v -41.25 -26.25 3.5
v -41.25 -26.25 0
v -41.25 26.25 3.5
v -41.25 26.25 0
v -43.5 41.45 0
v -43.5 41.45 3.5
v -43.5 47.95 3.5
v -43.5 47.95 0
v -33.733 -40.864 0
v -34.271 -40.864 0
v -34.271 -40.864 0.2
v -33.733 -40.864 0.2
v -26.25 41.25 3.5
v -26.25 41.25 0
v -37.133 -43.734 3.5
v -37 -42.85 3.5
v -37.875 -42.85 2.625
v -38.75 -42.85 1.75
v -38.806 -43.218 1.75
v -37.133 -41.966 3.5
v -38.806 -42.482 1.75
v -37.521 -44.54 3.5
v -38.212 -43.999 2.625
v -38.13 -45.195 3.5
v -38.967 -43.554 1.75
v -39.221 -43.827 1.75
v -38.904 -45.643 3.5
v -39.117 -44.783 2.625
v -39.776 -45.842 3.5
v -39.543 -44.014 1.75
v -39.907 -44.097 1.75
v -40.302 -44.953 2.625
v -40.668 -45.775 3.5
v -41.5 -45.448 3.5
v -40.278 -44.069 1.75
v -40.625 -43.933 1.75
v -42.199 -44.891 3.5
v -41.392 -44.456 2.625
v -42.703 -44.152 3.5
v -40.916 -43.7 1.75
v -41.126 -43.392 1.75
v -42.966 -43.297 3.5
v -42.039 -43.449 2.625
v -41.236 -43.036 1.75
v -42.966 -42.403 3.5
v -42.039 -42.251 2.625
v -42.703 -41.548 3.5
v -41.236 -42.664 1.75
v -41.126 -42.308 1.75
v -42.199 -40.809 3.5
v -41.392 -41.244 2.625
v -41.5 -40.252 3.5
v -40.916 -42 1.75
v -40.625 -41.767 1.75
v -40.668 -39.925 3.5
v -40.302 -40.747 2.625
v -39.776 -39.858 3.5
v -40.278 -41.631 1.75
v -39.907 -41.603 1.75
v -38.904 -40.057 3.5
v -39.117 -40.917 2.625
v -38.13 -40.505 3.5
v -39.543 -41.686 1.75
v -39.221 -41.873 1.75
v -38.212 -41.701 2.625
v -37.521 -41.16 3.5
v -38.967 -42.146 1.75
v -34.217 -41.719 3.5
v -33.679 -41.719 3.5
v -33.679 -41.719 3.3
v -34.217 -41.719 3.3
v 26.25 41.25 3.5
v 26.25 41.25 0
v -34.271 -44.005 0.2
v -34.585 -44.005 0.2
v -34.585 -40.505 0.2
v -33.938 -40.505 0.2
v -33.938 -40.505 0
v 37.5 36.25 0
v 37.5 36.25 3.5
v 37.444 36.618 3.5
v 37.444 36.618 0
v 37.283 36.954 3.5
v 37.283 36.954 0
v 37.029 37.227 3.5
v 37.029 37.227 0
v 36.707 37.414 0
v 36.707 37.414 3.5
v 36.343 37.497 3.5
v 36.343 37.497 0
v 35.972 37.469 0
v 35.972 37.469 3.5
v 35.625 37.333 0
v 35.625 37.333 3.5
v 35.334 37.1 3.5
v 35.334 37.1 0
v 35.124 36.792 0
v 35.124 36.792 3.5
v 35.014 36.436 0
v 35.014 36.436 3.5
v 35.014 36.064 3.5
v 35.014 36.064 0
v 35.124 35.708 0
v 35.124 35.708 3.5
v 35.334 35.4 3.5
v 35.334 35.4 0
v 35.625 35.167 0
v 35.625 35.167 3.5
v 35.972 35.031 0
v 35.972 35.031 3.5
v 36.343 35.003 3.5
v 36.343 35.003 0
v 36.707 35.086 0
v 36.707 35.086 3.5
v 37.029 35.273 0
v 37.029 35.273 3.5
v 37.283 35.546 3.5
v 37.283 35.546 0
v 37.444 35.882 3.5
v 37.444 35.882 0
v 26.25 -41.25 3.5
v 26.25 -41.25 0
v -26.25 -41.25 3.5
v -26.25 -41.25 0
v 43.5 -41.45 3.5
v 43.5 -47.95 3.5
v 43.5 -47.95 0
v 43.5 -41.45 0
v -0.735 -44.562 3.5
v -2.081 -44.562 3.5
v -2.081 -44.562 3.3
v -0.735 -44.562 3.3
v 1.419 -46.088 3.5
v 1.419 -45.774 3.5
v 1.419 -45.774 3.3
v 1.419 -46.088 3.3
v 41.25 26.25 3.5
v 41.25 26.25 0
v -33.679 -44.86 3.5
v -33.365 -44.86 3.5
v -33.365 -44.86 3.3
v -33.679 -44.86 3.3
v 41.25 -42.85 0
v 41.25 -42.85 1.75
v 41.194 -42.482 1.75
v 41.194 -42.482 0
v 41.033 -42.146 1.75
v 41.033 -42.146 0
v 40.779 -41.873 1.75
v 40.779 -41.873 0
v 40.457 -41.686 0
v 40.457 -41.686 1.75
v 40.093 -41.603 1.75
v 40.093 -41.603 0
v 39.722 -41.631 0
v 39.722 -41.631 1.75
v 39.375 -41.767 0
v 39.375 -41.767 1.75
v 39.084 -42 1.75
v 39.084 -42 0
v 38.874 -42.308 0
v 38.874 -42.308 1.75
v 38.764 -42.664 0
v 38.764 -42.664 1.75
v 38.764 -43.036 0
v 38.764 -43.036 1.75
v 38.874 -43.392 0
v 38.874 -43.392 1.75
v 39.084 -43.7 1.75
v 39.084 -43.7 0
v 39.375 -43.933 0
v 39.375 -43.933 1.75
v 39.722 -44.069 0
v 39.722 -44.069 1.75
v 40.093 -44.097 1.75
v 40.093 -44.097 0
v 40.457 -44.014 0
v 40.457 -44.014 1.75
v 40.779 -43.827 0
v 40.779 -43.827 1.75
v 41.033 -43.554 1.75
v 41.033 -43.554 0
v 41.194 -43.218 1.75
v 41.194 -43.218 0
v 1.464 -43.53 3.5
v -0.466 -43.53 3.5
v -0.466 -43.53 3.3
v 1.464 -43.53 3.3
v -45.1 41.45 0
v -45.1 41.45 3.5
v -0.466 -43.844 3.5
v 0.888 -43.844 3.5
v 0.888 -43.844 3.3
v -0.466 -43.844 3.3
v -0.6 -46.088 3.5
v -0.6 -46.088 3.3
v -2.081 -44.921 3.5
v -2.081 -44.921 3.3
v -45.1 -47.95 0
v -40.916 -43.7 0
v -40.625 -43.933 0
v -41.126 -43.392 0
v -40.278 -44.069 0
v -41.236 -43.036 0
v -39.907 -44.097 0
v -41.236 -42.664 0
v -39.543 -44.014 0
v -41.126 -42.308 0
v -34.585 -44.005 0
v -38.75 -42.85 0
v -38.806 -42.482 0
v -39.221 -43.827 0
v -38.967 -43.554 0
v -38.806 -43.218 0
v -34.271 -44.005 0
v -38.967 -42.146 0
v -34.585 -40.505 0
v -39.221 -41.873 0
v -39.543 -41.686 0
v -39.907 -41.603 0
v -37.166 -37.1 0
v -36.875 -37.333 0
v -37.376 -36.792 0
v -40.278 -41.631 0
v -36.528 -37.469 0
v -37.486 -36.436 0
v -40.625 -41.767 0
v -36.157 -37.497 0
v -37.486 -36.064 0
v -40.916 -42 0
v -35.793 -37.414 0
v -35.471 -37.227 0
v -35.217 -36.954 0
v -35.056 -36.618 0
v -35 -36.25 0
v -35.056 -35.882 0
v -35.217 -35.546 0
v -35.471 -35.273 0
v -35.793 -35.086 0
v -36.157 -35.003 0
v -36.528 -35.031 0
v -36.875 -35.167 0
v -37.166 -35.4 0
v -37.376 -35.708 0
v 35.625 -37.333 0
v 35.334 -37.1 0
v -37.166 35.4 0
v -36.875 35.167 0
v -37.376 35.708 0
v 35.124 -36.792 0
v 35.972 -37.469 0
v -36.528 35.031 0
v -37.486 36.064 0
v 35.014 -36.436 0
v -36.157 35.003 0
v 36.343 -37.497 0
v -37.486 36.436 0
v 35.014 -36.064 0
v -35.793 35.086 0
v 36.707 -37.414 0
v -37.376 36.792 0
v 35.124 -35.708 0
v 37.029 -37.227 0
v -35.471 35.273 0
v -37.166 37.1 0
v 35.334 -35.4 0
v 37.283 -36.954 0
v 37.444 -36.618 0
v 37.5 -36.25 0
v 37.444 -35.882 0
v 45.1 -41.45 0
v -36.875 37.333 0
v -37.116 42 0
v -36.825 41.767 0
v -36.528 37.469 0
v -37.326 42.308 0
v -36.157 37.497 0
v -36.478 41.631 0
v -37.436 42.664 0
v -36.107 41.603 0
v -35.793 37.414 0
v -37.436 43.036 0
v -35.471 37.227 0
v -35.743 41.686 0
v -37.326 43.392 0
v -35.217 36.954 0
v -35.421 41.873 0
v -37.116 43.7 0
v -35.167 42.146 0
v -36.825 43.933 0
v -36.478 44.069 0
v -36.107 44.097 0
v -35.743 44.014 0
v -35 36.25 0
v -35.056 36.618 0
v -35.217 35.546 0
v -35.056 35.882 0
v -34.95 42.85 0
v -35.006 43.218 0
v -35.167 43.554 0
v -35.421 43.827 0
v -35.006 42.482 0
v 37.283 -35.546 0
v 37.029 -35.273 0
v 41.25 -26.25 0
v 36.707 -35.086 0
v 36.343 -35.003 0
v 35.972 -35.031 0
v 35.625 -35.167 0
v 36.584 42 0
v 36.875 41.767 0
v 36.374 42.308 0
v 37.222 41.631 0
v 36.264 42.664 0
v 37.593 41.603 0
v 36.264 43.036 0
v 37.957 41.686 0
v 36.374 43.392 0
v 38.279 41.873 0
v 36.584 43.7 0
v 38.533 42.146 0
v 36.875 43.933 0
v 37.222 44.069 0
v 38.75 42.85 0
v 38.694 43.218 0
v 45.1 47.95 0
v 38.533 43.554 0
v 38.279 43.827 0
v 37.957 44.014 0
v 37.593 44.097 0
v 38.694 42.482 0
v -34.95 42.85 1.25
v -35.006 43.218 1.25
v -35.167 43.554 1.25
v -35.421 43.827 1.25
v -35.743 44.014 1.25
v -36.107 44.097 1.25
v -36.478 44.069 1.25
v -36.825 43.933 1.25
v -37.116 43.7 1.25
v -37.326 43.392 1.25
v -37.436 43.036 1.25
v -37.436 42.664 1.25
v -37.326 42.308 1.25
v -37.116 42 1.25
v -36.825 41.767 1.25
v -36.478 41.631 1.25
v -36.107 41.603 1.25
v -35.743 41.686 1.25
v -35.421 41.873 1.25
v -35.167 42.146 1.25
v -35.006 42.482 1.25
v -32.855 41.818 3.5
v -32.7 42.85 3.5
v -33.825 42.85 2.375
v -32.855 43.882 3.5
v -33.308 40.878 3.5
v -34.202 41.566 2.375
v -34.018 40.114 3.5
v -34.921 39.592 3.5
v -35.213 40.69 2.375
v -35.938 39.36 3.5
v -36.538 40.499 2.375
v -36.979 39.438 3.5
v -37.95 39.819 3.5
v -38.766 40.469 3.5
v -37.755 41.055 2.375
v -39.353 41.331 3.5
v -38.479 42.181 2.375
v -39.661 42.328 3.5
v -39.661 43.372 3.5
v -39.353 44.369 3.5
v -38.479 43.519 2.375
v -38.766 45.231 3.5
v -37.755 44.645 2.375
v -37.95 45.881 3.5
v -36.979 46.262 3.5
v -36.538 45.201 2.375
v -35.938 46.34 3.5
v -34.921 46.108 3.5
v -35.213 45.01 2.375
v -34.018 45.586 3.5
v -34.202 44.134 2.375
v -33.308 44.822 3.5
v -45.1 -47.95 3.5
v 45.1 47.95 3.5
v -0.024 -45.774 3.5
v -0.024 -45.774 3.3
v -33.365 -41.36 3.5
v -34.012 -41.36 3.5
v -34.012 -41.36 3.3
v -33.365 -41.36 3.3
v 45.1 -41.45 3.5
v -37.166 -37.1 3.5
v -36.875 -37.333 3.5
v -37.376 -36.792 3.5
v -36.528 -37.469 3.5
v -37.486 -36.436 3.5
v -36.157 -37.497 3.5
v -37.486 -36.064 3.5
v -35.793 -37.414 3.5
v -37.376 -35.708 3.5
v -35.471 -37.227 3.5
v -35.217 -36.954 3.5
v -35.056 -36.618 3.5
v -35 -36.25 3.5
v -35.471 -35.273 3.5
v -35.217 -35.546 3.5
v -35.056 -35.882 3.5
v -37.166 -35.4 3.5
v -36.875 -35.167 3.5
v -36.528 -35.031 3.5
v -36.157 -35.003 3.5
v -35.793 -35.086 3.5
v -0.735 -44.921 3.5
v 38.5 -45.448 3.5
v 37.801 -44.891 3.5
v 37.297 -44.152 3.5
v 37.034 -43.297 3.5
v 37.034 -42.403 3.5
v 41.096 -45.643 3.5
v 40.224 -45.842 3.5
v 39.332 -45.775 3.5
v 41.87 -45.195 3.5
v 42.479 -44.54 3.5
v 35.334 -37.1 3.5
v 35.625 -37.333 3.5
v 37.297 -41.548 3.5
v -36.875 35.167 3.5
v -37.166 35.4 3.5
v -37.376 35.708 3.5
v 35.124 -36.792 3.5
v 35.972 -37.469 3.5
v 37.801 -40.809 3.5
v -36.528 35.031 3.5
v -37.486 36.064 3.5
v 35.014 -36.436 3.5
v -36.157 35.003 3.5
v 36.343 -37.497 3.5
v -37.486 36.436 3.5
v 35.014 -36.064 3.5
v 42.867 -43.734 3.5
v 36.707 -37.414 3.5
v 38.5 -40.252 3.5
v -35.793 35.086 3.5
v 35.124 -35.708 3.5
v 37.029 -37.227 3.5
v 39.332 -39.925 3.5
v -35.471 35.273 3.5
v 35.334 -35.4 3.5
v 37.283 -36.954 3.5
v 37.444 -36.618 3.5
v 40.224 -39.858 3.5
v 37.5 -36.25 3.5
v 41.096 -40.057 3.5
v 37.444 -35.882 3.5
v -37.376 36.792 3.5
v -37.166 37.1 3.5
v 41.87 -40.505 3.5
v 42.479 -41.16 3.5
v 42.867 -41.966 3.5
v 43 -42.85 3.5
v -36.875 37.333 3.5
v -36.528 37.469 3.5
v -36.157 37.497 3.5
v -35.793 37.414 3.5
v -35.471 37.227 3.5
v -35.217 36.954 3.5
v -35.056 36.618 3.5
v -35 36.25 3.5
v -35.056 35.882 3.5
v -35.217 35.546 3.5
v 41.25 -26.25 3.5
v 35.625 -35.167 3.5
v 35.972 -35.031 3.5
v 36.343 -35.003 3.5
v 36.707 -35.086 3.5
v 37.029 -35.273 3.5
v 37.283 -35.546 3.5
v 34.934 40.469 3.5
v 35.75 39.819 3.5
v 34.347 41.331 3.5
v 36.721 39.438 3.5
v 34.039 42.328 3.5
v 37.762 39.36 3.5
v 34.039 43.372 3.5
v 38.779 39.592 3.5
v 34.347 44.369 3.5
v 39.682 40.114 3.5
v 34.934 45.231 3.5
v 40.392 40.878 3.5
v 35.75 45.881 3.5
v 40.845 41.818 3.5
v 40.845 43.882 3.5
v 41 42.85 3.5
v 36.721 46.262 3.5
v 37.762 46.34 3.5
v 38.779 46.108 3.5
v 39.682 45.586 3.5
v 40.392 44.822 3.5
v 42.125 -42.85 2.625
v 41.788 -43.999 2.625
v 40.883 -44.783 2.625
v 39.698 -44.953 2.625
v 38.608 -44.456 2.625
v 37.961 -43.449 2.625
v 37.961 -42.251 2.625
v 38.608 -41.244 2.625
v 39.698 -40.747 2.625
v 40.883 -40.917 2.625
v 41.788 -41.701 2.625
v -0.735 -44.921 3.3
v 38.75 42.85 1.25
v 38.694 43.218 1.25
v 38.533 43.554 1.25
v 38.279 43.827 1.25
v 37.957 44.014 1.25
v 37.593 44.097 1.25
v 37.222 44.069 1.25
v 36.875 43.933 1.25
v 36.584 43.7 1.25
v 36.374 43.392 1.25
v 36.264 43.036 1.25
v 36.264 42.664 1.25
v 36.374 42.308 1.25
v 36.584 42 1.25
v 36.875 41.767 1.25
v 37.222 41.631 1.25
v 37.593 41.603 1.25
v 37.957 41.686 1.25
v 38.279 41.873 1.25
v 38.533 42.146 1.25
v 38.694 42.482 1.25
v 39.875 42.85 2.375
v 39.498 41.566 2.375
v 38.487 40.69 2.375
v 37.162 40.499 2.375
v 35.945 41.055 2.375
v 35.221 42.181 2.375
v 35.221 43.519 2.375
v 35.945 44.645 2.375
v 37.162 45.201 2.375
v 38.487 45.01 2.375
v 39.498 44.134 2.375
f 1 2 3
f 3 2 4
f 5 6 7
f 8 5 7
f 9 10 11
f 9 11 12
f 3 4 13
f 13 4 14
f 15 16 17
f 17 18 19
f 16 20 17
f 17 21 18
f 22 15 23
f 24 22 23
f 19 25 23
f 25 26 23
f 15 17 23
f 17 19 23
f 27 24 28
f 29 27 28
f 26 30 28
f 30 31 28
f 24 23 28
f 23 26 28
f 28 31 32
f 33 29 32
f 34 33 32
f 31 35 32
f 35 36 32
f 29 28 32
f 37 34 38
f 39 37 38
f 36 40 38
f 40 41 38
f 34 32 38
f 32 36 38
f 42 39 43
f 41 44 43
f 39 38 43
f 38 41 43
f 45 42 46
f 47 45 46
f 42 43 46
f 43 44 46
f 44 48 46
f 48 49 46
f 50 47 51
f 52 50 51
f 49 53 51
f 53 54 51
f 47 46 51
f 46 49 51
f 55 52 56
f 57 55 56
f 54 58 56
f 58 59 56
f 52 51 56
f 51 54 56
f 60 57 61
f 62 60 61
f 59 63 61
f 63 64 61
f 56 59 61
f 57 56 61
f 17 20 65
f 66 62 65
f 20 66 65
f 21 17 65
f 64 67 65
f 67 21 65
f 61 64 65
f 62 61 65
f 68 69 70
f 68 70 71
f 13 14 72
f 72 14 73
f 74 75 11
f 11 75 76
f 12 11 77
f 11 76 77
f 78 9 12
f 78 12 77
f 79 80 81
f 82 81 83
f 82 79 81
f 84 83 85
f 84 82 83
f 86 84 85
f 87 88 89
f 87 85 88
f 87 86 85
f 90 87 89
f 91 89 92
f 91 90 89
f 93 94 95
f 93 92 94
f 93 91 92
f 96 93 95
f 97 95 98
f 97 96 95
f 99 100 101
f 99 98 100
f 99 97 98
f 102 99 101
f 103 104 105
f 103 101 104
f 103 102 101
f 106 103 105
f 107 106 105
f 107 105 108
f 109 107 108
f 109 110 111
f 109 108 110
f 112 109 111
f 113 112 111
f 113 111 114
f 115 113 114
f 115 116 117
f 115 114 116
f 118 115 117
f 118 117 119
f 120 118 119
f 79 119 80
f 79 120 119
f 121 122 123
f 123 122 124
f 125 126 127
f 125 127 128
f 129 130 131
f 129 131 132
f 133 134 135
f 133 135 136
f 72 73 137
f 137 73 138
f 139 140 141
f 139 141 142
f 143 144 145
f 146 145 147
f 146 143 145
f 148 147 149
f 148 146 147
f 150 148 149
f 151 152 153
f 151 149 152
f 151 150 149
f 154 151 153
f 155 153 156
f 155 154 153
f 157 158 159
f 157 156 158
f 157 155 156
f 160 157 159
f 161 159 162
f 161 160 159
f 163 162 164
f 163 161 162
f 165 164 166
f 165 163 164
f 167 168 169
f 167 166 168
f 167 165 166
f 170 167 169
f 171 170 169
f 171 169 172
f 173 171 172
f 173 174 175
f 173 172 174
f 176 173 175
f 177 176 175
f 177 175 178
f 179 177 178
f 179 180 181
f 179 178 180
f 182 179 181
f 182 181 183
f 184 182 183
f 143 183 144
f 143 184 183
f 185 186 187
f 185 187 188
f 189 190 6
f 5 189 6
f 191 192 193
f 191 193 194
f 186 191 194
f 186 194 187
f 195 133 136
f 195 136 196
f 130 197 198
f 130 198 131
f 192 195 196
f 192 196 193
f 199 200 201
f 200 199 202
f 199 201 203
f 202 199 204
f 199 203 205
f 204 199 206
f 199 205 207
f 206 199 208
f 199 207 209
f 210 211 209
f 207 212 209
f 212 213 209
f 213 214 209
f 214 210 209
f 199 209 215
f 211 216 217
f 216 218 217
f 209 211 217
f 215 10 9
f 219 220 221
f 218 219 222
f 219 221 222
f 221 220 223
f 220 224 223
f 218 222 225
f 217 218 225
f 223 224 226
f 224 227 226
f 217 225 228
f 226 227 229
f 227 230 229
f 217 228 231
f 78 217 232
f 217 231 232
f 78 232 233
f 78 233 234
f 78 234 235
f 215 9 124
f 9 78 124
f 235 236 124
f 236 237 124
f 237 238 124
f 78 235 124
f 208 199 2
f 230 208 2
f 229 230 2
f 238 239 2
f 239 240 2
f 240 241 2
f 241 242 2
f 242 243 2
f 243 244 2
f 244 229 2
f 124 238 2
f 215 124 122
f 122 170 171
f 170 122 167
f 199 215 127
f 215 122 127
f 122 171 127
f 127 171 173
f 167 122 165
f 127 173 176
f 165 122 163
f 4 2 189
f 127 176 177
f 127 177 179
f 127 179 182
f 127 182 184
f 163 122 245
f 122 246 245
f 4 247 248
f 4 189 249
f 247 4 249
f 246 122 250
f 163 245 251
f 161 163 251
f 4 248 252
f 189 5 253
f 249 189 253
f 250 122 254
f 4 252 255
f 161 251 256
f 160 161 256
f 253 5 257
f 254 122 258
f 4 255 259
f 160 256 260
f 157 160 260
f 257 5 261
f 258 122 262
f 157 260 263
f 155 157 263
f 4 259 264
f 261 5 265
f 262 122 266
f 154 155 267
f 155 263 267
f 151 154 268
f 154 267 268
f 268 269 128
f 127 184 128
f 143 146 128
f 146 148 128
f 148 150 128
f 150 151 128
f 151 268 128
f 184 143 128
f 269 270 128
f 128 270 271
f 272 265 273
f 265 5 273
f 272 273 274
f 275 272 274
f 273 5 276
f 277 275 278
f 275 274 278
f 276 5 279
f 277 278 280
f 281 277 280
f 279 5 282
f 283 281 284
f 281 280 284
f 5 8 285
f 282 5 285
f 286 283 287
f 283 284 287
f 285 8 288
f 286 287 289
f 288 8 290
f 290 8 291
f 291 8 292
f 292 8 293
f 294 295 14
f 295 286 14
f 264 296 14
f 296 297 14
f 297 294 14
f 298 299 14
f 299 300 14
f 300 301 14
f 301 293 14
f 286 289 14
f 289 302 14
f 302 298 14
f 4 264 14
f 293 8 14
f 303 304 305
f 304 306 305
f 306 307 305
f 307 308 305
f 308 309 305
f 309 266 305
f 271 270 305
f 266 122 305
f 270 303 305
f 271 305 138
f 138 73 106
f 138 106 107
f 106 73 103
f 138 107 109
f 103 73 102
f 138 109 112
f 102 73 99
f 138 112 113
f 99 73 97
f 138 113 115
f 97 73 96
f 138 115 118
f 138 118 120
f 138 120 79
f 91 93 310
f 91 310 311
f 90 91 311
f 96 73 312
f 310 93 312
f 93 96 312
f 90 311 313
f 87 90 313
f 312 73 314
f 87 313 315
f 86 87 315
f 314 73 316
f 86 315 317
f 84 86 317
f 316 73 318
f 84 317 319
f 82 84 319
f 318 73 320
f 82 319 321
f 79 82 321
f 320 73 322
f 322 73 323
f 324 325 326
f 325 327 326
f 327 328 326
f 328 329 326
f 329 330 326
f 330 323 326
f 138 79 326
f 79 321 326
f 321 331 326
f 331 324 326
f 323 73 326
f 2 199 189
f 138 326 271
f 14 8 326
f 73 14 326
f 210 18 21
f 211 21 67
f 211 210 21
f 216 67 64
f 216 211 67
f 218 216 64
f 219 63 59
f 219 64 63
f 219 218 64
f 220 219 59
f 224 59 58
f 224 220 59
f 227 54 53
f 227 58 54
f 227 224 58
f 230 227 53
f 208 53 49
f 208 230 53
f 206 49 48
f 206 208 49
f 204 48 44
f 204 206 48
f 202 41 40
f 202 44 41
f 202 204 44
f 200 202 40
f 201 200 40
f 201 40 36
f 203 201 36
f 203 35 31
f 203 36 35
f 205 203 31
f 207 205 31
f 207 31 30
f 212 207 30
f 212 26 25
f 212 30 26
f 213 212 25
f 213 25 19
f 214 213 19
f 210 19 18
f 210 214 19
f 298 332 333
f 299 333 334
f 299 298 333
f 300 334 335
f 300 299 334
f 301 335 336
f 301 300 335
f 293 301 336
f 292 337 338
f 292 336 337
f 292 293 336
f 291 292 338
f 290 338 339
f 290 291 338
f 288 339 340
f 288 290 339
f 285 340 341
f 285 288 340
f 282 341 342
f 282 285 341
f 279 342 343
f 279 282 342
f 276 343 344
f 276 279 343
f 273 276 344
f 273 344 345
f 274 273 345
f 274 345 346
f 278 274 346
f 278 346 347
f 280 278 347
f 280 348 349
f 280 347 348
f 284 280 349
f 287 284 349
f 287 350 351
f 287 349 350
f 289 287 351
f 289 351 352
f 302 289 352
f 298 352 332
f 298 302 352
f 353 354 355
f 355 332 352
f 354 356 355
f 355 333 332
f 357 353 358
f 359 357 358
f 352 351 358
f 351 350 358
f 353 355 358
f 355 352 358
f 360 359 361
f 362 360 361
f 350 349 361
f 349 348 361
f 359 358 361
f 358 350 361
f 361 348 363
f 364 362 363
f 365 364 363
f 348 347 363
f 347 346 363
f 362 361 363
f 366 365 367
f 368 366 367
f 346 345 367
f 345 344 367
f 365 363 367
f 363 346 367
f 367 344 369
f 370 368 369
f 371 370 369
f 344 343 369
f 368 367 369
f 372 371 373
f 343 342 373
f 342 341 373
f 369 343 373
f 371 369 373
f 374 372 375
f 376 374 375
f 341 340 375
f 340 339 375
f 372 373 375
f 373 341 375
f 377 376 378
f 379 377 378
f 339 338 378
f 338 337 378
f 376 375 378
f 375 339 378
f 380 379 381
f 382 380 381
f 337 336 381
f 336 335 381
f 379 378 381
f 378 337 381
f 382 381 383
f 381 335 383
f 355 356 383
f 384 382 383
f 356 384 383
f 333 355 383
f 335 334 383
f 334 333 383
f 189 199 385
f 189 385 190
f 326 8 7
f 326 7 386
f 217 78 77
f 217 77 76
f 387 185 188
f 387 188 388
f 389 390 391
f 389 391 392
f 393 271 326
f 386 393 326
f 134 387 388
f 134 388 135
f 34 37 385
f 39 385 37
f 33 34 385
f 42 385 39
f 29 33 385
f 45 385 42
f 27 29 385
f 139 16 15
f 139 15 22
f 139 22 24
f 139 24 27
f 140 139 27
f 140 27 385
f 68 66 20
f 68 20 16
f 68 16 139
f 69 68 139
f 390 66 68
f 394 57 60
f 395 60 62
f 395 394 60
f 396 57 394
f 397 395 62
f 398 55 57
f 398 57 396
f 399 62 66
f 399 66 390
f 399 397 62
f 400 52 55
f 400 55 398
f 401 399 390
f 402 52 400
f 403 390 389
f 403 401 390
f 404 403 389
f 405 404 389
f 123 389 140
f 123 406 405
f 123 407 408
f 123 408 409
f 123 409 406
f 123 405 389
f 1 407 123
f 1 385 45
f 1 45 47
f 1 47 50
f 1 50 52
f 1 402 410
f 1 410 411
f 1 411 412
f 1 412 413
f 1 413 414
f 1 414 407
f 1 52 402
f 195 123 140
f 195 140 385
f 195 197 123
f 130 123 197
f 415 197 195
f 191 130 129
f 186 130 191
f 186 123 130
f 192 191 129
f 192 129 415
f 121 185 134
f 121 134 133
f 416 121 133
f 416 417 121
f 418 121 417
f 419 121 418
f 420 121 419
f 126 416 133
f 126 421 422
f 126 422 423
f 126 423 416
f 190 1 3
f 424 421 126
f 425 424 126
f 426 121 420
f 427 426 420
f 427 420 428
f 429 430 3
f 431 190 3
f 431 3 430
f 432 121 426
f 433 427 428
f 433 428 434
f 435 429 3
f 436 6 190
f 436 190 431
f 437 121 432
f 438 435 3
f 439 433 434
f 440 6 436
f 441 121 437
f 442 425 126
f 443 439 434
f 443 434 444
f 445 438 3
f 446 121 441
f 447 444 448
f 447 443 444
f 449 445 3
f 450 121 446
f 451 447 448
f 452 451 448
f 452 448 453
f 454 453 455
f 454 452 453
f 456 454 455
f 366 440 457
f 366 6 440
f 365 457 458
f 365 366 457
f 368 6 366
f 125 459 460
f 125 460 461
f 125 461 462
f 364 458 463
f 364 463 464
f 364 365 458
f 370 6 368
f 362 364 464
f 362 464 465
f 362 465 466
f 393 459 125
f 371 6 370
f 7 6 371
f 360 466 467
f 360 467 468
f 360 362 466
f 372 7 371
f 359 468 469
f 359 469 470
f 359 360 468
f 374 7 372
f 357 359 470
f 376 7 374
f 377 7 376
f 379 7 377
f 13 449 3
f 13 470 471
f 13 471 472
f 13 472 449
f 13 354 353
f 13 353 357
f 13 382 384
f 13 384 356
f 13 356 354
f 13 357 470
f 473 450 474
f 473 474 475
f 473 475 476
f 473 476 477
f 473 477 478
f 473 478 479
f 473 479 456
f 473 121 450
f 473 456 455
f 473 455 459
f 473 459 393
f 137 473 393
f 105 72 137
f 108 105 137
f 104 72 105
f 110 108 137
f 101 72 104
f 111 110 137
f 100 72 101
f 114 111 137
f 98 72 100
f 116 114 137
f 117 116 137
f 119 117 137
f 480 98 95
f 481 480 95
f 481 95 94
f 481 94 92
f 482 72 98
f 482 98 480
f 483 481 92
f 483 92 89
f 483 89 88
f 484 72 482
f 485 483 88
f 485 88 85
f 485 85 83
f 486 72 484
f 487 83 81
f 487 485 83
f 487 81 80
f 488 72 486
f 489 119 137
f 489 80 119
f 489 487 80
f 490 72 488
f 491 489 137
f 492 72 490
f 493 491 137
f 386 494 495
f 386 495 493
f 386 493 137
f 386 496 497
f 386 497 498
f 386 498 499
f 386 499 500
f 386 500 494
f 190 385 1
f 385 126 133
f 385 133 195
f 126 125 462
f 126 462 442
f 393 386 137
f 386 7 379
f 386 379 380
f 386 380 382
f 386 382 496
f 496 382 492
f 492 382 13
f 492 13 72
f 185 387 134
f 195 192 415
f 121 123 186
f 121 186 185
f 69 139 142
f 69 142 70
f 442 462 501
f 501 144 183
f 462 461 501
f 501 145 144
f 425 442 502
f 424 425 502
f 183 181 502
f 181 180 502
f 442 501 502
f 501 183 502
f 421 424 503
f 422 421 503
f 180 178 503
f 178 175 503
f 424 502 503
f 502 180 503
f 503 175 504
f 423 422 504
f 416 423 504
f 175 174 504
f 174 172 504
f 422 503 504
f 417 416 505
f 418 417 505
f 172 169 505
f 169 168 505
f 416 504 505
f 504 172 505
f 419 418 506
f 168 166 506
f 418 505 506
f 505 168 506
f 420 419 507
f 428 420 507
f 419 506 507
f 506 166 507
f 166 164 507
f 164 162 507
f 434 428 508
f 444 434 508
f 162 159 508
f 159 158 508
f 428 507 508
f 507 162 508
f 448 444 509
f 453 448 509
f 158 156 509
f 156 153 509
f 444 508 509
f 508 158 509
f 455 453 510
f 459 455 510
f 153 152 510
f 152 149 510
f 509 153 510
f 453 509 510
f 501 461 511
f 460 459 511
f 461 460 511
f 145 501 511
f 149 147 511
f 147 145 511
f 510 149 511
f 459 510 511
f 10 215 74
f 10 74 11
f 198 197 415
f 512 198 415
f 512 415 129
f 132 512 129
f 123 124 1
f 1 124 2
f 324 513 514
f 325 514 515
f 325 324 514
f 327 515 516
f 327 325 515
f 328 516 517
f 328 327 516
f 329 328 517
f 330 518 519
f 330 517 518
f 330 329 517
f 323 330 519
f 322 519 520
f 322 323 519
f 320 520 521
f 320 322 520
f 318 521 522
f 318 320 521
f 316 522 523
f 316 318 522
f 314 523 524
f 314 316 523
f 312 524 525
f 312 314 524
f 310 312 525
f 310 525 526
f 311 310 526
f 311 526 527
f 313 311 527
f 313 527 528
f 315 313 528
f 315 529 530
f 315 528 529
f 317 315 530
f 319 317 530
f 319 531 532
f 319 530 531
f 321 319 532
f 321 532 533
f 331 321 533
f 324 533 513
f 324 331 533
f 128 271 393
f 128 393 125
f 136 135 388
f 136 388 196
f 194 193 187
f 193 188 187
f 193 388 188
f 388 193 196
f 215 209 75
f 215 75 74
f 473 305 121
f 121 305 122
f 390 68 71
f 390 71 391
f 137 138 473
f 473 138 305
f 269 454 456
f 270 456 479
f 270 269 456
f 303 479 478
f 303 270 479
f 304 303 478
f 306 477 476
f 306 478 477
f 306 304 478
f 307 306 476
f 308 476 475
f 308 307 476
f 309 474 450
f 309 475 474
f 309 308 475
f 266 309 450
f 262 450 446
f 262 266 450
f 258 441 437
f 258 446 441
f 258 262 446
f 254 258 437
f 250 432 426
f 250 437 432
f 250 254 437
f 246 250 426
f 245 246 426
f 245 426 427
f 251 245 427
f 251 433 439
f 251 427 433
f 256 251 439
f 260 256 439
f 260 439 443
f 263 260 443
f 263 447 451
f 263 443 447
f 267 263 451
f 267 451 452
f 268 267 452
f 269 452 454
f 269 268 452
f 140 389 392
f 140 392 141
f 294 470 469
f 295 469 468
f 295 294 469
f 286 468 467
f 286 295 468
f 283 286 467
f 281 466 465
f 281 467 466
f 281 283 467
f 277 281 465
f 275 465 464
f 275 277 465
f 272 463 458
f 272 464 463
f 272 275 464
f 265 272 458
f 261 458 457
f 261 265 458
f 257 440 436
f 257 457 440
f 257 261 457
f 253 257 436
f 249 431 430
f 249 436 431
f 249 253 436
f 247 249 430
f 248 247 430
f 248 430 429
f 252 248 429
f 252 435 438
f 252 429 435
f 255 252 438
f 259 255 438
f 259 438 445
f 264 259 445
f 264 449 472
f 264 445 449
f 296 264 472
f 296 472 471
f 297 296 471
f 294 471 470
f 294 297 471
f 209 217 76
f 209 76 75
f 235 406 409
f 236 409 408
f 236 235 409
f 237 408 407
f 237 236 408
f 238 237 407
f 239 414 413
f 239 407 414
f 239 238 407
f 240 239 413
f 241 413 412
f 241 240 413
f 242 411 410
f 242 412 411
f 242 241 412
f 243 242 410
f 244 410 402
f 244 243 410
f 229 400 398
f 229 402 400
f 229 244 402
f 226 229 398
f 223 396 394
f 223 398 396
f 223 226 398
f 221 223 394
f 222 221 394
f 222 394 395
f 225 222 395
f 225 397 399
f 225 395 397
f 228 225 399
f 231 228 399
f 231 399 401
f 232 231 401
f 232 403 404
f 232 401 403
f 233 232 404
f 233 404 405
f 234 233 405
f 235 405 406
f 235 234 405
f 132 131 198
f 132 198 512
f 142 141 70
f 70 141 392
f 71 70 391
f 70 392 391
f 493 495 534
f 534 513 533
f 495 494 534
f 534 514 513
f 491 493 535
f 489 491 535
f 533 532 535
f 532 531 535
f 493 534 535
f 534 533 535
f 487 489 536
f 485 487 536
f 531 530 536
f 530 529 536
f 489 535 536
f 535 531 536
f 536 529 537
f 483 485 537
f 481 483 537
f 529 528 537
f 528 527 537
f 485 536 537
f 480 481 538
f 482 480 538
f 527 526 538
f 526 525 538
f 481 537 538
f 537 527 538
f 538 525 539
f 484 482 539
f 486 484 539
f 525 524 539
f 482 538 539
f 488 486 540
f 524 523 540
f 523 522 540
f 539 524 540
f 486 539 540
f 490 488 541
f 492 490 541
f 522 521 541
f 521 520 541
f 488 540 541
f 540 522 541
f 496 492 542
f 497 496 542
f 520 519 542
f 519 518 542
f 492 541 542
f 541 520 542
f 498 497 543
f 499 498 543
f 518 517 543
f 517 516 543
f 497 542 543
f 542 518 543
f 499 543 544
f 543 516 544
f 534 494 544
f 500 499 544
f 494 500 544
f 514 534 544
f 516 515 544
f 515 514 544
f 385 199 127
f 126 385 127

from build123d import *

# Parameters (mm, degrees)
ESBO_O1_W                  = 90.2
ESBO_O1_H                  = 95.9
RESSALTO_EXTRUS_O1_DEPTH   = 3.5
ESBO_O2_R                  = 1.25
CORTE_EXTRUS_O1_DEPTH      = 5
CORTE_EXTRUS_O3_DEPTH      = 5
ESBO_O4_R                  = 1.25
CORTE_EXTRUS_O2_DEPTH      = 10
CHANFRO4_SIZE              = 1.75
CHANFRO5_SIZE              = 1.75
CHANFRO6_SIZE              = 2.25
CHANFRO7_SIZE              = 2.25
CORTE_EXTRUS_O4_DEPTH      = 0.2
CORTE_EXTRUS_O5_DEPTH      = 0.2
CORTE_EXTRUS_O7_DEPTH      = 66.920122118
CORTE_EXTRUS_O7_DEPTH_BACK = 5
ESBO_O7_W                  = 1.6
ESBO_O7_H                  = 6.5
CORTE_EXTRUS_O8_DEPTH      = 5
ESBO_O9_W                  = 1.346153846
ESBO_O9_H                  = 0.358974359
CORTE_EXTRUS_O9_DEPTH      = 0.2


with BuildPart() as part:
    # Esboço1 → Ressalto-extrusão1 (new body)
    with BuildSketch(Plane.XY):
        Rectangle(ESBO_O1_W, ESBO_O1_H)
    extrude(amount=RESSALTO_EXTRUS_O1_DEPTH)

    # Esboço2 → Corte-extrusão1 (cut)
    with BuildSketch(Plane.XY):
        with Locations((-36.2, 42.85)):
            Circle(ESBO_O2_R)
        with Locations((37.5, 42.85)):
            Circle(ESBO_O2_R)
        with Locations((40, -42.85)):
            Circle(ESBO_O2_R)
        with Locations((-40, -42.85)):
            Circle(ESBO_O2_R)
    extrude(amount=CORTE_EXTRUS_O1_DEPTH, mode=Mode.SUBTRACT)

    # Esboço3 → Corte-extrusão3 (cut)
    with BuildSketch(Plane.XY):
        Polygon((-26.25, 41.25), (26.25, 41.25), (41.25, 26.25), (41.25, -26.25), (26.25, -41.25), (-26.25, -41.25), (-41.25, -26.25), (-41.25, 26.25), align=None)
    extrude(amount=CORTE_EXTRUS_O3_DEPTH, mode=Mode.SUBTRACT)

    # Esboço4 → Corte-extrusão2 (cut)
    with BuildSketch(Plane.XY):
        with Locations((-36.25, 36.25)):
            Circle(ESBO_O4_R)
        with Locations((36.25, 36.25)):
            Circle(ESBO_O4_R)
        with Locations((-36.25, -36.25)):
            Circle(ESBO_O4_R)
        with Locations((36.25, -36.25)):
            Circle(ESBO_O4_R)
    extrude(amount=CORTE_EXTRUS_O2_DEPTH, mode=Mode.SUBTRACT)

    # Chanfro4
    chanfro4_edges = [part.edges().sort_by_distance(p)[0] for p in [
        (-41.25, -42.85, 3.5),
    ]]
    chamfer(chanfro4_edges, length=CHANFRO4_SIZE)

    # Chanfro5
    chanfro5_edges = [part.edges().sort_by_distance(p)[0] for p in [
        (38.75, -42.85, 3.5),
    ]]
    chamfer(chanfro5_edges, length=CHANFRO5_SIZE)

    # Chanfro6
    chanfro6_edges = [part.edges().sort_by_distance(p)[0] for p in [
        (-37.45, 42.85, 3.5),
    ]]
    chamfer(chanfro6_edges, length=CHANFRO6_SIZE)

    # Chanfro7
    chanfro7_edges = [part.edges().sort_by_distance(p)[0] for p in [
        (36.25, 42.85, 3.5),
    ]]
    chamfer(chanfro7_edges, length=CHANFRO7_SIZE)

    # Esboço5 → Corte-extrusão4 (cut)
    with BuildSketch(Plane.XY.offset(3.5)):
        Polygon((-34.011664728, -41.359633286), (-33.364529311, -41.359633286), (-33.364529311, -44.859633286), (-33.678631875, -44.859633286), (-33.678631875, -41.718607645), (-34.217093414, -41.718607645), align=None)
    extrude(amount=-CORTE_EXTRUS_O4_DEPTH, mode=Mode.SUBTRACT)

    # Esboço6 → Corte-extrusão5 (cut)
    with BuildSketch(Plane(origin=(0, 0, 0), x_dir=(-1, 0, 0), z_dir=(0, 0, -1))):
        Polygon((33.93825461, -40.504659527), (34.585390027, -40.504659527), (34.585390027, -44.004659527), (34.271287463, -44.004659527), (34.271287463, -40.863633886), (33.732825924, -40.863633886), align=None)
    extrude(amount=-CORTE_EXTRUS_O5_DEPTH, mode=Mode.SUBTRACT)

    # Esboço7 → Corte-extrusão7 (cut, two sides: drawn at the far end of the back side and taken through both)
    with BuildSketch(Plane(origin=(0, 0, 0), x_dir=(-1, 0, 0), z_dir=(0, 0, -1)).offset(-CORTE_EXTRUS_O7_DEPTH_BACK)):
        with Locations((-44.3, -44.7)):
            Rectangle(ESBO_O7_W, ESBO_O7_H)
    extrude(amount=CORTE_EXTRUS_O7_DEPTH + CORTE_EXTRUS_O7_DEPTH_BACK, mode=Mode.SUBTRACT)

    # Esboço8 → Corte-extrusão8 (cut)
    with BuildSketch(Plane.XY.offset(3.5)):
        Polygon((-43.5, 47.95), (-43.5, 41.45), (-45.1, 41.45), (-45.287231685, 41.45), (-45.287231685, 48.410891955), (-43.5, 48.410891955), align=None)
    extrude(amount=-CORTE_EXTRUS_O8_DEPTH, mode=Mode.SUBTRACT)

    # Esboço9 → Corte-extrusão9 (cut)
    with BuildSketch(Plane.XY.offset(3.5)):
        with Locations((-1.407956652, -44.741681875)):
            Rectangle(ESBO_O9_W, ESBO_O9_H)
        Polygon((-0.46564896, -43.530143413), (1.46383822, -43.530143413), (-0.023942229, -45.773733157), (1.418966425, -45.773733157), (1.418966425, -46.087835721), (-0.600264345, -46.087835721), (0.888217226, -43.844245977), (-0.46564896, -43.844245977), align=None)
    extrude(amount=-CORTE_EXTRUS_O9_DEPTH, mode=Mode.SUBTRACT)


solid = part.part
